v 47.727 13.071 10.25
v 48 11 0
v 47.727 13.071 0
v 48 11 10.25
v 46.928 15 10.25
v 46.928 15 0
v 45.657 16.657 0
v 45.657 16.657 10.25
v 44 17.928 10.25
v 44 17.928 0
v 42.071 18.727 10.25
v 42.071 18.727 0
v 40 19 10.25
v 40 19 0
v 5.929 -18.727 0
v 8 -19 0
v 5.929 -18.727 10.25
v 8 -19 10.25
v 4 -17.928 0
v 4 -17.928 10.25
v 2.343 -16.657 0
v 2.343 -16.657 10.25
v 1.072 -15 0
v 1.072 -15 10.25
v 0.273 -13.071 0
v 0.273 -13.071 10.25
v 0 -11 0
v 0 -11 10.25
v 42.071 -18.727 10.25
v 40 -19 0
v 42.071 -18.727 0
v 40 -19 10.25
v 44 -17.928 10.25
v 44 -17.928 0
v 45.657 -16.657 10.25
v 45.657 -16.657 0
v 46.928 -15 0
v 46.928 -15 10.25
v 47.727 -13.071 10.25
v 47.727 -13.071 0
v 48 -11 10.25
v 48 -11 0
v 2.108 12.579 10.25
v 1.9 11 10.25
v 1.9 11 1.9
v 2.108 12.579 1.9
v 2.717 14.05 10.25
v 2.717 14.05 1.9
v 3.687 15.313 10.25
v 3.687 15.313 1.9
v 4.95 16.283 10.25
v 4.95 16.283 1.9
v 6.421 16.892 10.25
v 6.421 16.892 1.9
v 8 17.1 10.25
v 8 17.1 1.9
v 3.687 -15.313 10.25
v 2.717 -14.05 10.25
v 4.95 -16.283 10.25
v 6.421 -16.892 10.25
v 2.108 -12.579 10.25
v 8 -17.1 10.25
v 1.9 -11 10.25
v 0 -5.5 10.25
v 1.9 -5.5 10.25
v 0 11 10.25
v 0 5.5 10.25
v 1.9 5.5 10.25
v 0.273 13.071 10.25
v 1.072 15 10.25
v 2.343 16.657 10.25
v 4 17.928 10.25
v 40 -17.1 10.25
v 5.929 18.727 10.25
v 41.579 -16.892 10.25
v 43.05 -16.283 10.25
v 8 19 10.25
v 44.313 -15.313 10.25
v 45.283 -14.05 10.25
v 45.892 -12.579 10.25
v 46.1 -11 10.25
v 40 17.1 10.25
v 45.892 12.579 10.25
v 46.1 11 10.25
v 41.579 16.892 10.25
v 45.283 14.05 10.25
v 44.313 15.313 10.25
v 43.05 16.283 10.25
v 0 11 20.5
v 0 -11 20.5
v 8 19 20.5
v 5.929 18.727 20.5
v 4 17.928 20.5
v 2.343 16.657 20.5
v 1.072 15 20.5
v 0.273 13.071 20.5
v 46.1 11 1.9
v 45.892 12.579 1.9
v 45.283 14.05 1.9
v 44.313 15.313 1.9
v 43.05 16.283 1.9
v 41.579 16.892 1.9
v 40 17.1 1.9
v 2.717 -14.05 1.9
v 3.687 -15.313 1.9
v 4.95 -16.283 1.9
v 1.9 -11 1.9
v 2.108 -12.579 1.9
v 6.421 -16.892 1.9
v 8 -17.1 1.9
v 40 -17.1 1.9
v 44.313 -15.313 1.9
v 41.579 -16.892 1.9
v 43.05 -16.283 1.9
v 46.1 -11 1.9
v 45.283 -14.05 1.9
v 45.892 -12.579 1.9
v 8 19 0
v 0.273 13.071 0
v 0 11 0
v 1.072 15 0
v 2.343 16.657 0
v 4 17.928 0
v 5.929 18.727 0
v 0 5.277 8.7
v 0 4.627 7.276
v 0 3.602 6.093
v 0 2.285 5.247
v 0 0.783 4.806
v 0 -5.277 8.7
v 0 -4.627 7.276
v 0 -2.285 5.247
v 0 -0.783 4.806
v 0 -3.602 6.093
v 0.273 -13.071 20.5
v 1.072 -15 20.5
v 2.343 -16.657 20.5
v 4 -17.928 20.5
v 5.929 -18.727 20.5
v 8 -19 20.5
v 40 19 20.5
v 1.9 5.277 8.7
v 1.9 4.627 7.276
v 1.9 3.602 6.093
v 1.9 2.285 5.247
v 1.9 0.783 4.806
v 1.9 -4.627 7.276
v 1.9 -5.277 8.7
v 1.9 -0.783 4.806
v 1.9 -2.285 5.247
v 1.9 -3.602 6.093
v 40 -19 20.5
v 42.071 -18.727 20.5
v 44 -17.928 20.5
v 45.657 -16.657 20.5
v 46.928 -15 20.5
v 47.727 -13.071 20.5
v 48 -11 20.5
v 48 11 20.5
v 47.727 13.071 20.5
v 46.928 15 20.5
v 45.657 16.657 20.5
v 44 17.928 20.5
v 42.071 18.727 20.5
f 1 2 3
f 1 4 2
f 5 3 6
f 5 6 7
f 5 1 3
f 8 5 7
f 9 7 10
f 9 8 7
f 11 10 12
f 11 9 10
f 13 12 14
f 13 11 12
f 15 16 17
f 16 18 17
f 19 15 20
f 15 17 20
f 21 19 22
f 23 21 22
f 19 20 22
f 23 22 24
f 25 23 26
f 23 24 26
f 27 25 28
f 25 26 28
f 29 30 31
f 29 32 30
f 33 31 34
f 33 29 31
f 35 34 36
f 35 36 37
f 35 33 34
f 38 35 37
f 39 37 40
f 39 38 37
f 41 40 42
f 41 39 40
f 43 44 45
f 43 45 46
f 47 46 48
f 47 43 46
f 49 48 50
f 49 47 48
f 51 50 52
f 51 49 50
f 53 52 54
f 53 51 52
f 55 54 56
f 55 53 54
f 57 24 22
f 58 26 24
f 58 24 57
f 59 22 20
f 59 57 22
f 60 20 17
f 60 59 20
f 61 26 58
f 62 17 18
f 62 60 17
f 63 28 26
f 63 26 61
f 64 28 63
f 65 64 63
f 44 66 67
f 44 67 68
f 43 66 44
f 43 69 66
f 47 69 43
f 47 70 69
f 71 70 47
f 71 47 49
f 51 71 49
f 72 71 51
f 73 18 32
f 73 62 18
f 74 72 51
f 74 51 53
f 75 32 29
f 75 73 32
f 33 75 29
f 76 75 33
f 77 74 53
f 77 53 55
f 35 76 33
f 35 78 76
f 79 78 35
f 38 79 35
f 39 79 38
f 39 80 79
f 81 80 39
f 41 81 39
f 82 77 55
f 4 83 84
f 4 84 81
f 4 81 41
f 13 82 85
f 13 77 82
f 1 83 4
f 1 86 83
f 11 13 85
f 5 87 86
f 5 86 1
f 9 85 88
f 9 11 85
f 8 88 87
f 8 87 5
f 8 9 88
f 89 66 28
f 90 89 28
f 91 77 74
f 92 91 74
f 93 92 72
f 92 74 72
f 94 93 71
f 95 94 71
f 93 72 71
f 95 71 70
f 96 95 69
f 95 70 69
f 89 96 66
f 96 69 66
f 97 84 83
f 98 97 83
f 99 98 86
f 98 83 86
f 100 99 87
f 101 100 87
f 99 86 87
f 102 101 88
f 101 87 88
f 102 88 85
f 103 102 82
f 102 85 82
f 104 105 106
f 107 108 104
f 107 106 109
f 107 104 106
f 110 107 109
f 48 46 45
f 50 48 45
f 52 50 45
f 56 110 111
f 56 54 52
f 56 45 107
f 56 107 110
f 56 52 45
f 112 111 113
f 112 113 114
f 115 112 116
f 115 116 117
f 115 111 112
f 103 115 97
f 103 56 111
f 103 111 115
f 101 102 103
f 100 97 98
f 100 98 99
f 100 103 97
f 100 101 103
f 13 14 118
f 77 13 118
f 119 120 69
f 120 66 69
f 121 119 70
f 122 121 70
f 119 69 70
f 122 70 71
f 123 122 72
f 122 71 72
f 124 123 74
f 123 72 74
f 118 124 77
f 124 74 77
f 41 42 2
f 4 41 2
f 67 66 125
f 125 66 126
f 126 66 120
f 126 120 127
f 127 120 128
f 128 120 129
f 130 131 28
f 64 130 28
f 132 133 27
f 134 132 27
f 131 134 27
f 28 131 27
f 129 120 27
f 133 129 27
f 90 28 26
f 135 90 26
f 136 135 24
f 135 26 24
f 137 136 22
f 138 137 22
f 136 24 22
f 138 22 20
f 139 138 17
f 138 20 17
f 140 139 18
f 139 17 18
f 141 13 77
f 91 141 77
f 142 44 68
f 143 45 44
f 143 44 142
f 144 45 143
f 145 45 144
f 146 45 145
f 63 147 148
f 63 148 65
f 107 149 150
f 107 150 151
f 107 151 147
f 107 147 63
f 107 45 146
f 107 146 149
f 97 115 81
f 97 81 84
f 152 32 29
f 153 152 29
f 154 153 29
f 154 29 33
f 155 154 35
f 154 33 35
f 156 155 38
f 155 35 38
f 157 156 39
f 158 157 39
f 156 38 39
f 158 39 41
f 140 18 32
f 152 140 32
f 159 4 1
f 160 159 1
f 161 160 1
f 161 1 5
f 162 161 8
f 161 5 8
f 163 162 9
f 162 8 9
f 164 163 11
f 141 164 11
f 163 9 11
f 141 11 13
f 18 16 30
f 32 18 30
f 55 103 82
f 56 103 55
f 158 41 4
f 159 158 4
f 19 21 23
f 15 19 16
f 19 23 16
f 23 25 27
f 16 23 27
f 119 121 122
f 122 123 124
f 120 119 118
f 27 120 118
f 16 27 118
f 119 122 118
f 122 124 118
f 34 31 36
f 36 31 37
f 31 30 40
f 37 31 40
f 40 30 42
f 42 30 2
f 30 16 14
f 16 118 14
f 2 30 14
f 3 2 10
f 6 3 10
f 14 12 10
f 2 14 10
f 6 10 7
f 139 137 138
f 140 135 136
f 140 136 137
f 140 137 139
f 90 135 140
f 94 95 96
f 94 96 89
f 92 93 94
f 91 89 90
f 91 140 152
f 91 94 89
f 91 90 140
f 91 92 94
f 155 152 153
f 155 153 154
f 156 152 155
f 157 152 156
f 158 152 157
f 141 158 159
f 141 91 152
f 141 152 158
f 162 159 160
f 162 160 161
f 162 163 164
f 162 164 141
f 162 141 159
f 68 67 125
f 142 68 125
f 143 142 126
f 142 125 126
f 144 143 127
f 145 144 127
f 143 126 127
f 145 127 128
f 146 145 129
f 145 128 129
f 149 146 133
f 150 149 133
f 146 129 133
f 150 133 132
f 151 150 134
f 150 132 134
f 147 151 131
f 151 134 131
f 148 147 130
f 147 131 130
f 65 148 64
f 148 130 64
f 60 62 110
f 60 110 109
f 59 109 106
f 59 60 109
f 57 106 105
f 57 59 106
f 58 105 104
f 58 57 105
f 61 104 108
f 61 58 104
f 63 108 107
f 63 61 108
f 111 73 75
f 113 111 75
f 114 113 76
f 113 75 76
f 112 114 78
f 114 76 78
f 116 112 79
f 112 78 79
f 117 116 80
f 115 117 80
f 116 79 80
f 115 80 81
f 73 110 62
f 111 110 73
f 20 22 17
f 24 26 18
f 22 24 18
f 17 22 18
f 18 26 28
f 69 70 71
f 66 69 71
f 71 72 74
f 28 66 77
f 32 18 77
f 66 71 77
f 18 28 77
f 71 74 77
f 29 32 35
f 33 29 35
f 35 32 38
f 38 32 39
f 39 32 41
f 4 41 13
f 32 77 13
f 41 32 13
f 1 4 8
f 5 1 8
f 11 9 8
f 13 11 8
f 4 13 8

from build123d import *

# Parameters (mm, degrees)
F1_DEPTH = 10.25
F2_R     = 8
F3_R     = 8
F4_T     = -1.9
F7_DEPTH = 10.25
F8_DEPTH = 1.9


with BuildPart() as f1:
    # F0 (on Top) → F1 (new body)
    with BuildSketch(Plane.XY):
        Polygon((0, 19), (0, 0), (0, -19), (48, -19), (48, 19), align=None)
    extrude(amount=F1_DEPTH)

    # F2
    f2_edges = [f1.edges().sort_by_distance(p)[0] for p in [
        (48, -19, 5.125),
        (48, 19, 5.125),
    ]]
    fillet(f2_edges, radius=F2_R)

    # F3
    f3_edges = [f1.edges().sort_by_distance(p)[0] for p in [
        (0, -19, 5.125),
        (0, 19, 5.125),
    ]]
    fillet(f3_edges, radius=F3_R)

    # F4
    f4_openings = [f1.faces().sort_by_distance(p)[0] for p in [
        (24, 0, 10.25),
    ]]
    offset(amount=F4_T, openings=f4_openings)

    # F5 (on face) → F8 (cut, through all)
    with BuildSketch(Plane(origin=(0, 0, 0), x_dir=(0, -1, 0), z_dir=(-1, 0, 0))):
        with BuildLine():
            ThreePointArc((-5.5, 10.25), (0, 4.75), (5.5, 10.25))
            Line((5.5, 10.25), (-5.5, 10.25))
        make_face()
    extrude(amount=-F8_DEPTH, mode=Mode.SUBTRACT)


with BuildPart() as f7:
    # F6 (on face) → F7 (new body)
    with BuildSketch(Plane.XY.offset(10.25)):
        with BuildLine():
            Line((0, 11), (0, -11))
            ThreePointArc((0, -11), (2.3431457505, -16.6568542495), (8, -19))
            Line((8, -19), (40, -19))
            ThreePointArc((40, -19), (45.6568542495, -16.6568542495), (48, -11))
            Line((48, -11), (48, 11))
            ThreePointArc((48, 11), (45.6568542495, 16.6568542495), (40, 19))
            Line((40, 19), (8, 19))
            ThreePointArc((8, 19), (2.3431457505, 16.6568542495), (0, 11))
        make_face()
    extrude(amount=F7_DEPTH)


solid = Compound([f1.part, f7.part])
